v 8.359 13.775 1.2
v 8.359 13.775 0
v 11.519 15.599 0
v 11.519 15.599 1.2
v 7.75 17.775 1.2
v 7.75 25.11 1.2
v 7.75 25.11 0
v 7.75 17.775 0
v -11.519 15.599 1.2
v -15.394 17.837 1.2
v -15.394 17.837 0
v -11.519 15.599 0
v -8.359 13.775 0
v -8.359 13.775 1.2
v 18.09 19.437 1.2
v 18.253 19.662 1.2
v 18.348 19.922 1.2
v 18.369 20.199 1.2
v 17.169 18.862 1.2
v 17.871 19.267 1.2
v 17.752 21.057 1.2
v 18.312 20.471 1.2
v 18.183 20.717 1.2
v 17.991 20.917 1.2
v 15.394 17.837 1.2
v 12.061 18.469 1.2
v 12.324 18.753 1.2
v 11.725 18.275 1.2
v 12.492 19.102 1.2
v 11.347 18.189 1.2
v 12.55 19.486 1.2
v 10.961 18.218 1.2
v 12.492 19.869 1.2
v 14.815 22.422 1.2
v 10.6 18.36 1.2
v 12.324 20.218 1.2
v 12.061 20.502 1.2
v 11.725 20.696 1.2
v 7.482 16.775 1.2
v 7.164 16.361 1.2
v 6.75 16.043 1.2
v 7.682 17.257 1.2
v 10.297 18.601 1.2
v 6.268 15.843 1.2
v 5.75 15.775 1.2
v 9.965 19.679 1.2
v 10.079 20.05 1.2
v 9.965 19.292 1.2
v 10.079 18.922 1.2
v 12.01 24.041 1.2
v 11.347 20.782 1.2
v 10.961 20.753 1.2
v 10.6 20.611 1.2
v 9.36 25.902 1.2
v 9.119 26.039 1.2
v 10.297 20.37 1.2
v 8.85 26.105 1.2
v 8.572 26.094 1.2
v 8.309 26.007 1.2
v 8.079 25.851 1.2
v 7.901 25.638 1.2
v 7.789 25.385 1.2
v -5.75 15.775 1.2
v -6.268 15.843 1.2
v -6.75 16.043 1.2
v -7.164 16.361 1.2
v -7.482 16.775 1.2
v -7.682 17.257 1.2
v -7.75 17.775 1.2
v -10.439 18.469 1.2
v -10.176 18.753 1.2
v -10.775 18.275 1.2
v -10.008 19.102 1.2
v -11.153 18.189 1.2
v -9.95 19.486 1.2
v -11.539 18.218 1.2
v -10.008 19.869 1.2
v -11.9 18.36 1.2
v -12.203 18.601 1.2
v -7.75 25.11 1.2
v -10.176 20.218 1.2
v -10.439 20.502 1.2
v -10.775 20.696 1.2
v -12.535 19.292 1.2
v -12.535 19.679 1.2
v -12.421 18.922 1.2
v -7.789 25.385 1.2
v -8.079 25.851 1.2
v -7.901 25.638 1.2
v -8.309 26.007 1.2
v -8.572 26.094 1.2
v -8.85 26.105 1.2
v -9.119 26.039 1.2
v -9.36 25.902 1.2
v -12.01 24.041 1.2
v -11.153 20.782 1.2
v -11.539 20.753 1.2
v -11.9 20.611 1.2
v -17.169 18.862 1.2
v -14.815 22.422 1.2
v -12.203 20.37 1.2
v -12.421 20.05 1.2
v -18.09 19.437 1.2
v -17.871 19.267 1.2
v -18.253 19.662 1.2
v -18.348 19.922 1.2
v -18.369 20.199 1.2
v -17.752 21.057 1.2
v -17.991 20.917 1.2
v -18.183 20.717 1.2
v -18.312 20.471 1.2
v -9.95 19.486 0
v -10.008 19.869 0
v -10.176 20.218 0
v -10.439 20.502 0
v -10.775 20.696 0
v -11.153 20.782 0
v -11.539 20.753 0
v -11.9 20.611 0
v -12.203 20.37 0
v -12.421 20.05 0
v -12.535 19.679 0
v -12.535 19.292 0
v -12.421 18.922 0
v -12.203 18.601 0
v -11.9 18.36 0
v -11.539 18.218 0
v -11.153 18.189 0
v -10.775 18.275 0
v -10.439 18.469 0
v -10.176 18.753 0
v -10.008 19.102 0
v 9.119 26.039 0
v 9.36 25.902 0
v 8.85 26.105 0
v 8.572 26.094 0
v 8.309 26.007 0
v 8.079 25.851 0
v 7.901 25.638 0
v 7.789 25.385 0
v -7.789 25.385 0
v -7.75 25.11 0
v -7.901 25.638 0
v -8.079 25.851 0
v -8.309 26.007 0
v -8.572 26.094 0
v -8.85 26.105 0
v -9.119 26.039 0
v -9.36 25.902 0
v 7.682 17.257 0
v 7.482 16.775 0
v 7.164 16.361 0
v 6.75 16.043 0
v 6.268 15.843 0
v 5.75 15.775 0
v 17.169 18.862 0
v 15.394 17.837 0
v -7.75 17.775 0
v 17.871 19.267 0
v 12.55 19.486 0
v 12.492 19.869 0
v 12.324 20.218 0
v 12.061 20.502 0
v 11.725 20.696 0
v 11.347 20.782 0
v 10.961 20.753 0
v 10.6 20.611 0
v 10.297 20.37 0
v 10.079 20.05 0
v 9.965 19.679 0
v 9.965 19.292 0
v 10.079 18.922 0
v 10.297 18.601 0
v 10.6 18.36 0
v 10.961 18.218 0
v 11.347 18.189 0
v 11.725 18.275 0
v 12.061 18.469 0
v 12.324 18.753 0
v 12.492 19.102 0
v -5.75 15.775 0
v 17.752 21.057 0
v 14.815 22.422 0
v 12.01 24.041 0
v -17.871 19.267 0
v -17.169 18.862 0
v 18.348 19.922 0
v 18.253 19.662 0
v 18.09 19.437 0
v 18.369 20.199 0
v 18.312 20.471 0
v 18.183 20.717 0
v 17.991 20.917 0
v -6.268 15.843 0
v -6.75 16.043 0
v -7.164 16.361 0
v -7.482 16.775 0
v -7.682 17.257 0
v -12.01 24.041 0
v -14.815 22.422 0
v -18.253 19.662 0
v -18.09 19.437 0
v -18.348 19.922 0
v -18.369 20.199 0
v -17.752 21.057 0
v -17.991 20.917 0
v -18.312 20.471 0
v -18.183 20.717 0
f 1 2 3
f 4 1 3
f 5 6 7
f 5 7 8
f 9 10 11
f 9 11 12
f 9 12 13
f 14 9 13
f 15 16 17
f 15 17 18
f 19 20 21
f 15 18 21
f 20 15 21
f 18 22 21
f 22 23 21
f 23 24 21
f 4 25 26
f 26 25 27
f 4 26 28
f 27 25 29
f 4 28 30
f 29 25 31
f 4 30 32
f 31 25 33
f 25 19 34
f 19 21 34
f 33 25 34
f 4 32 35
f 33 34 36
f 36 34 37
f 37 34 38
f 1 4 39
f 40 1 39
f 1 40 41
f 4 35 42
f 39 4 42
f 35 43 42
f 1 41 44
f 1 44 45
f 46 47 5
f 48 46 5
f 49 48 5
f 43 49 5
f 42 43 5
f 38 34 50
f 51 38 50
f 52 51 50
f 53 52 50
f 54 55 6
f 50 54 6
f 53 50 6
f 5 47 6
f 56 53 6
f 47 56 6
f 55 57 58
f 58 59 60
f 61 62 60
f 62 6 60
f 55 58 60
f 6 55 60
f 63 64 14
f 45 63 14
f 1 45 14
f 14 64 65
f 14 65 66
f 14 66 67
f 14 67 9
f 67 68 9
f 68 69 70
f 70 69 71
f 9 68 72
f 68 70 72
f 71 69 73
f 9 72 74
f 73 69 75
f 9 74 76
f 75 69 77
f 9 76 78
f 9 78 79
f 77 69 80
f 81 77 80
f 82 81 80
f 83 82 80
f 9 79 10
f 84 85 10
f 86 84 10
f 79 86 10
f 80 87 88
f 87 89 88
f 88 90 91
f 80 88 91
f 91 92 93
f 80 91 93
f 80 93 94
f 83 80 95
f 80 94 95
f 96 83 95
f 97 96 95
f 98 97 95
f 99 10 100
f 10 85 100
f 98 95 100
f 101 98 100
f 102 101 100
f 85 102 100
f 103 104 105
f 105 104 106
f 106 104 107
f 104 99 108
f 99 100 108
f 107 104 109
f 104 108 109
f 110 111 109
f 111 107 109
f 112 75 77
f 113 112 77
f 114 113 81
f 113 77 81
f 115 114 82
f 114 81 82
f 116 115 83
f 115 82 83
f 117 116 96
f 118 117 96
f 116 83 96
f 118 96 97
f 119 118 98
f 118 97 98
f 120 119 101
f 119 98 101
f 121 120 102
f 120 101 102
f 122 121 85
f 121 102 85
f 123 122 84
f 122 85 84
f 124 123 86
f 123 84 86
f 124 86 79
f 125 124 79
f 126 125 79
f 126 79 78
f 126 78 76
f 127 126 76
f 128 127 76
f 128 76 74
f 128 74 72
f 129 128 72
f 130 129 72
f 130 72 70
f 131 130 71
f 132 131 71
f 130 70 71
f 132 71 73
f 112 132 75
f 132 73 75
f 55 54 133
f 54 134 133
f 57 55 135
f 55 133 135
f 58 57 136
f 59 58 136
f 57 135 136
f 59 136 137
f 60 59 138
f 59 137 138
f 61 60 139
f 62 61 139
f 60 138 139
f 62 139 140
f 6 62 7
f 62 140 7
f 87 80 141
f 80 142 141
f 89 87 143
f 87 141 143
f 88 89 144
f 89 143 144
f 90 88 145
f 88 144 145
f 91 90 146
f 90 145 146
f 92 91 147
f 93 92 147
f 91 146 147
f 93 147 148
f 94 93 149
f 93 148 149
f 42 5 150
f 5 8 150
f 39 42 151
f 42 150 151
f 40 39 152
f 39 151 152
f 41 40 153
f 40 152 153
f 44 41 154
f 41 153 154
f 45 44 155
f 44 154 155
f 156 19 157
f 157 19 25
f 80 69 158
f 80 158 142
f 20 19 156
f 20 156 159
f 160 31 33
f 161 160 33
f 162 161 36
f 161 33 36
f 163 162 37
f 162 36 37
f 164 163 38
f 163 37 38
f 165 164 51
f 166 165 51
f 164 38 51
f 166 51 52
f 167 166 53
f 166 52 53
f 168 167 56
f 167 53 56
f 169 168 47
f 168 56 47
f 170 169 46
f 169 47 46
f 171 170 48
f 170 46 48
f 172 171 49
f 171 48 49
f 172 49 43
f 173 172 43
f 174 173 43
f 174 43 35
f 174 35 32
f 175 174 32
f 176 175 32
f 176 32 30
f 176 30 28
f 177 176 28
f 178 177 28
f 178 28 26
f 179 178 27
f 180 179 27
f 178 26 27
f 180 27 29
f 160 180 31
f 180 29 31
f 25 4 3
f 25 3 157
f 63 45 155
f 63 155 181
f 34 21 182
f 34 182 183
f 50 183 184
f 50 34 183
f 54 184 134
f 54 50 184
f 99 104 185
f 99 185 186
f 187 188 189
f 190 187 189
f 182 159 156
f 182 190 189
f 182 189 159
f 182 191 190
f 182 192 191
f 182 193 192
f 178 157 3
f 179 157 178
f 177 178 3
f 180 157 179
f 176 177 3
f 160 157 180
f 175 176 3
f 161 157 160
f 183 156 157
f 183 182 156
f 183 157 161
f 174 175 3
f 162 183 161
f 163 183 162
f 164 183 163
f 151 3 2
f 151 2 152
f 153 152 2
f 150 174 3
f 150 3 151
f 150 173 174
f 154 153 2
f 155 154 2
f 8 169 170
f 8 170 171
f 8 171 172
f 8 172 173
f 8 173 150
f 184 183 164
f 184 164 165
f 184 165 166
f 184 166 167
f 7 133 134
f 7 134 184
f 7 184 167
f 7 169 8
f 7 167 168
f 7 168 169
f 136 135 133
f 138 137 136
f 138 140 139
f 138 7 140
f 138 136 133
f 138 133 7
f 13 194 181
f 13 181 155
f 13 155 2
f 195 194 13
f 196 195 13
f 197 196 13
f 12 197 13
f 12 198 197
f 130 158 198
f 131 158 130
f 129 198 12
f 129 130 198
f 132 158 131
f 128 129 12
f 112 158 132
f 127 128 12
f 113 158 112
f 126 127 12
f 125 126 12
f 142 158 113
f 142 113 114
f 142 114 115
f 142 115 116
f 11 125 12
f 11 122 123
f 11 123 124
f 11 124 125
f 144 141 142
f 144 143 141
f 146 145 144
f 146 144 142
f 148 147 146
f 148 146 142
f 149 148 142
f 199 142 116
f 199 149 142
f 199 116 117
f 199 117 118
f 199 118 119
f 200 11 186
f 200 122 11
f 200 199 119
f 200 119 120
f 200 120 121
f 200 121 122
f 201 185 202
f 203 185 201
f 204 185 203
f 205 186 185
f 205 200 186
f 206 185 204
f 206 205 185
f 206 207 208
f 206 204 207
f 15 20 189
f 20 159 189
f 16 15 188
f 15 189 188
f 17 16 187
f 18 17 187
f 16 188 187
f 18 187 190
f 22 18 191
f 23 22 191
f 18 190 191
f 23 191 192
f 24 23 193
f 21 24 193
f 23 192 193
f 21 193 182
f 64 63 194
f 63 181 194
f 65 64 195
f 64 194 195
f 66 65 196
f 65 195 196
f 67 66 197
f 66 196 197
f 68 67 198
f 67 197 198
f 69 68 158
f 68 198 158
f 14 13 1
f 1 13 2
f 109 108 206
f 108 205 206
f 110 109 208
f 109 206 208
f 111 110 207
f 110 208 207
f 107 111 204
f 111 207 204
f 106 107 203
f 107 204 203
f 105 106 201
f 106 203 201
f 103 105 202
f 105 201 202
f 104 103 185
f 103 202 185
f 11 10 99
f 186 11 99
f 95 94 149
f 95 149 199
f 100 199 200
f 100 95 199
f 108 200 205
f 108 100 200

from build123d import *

# Parameters (mm, degrees)
SKETCH_2_R                       = 28.3
EXTRUDE_1_DEPTH                  = 1.2
CUT_EXTRUDE_1_DEPTH              = 41.04022977
FILLET_1_R                       = 2
FILLET_2_R                       = 0.2
PATTERN_CIRCULAR_2_COUNT         = 6
FILLET_1_OF_PATTERN_CIRCULAR_2_R = 2
FILLET_2_OF_PATTERN_CIRCULAR_2_R = 0.2
SKETCH_4_R                       = 1.25
SKETCH_4_R_2                     = 1.5
CUT_EXTRUDE_2_DEPTH              = 40.283043416
CUT_EXTRUDE_START                = -1.2
CUT_EXTRUDE_4_DEPTH              = 1.2
SKETCH_7_W                       = 2.25
SKETCH_7_H                       = 2.05
EXTRUDE_2_DEPTH                  = 1.2
SKETCH_8_R                       = 1.3
CUT_EXTRUDE_6_DEPTH              = 1.2
CUT_EXTRUDE_7_DEPTH              = 1.2
FILLET_4_R                       = 1


with BuildPart() as part:
    # ｽｹｯﾁ2 → ﾎﾞｽ - 押し出し1 (new body)
    with BuildSketch(Plane.XY):
        Circle(SKETCH_2_R)
    extrude(amount=EXTRUDE_1_DEPTH)

    # ｽｹｯﾁ3 → ｶｯﾄ - 押し出し1 (cut, through all)
    with BuildSketch(Plane.XY.offset(1.2)):
        Polygon((-7.75, 30.775), (7.75, 30.775), (7.75, 24.3), (10, 24.3), (10, 22.25), (7.75, 22.25), (7.75, 15.775), (-7.75, 15.775), (-7.75, 22.25), (-10, 22.25), (-10, 24.3), (-7.75, 24.3), align=None)
    cut_extrude_1 = extrude(amount=-CUT_EXTRUDE_1_DEPTH, mode=Mode.SUBTRACT)

    # ﾌｨﾚｯﾄ1
    fillet_1_edges = [part.edges().sort_by_distance(p)[0] for p in [
        (7.75, 15.775, 0.6),
        (-7.75, 15.775, 0.6),
    ]]
    fillet(fillet_1_edges, radius=FILLET_1_R)

    # ﾌｨﾚｯﾄ2
    fillet_2_edges = [part.edges().sort_by_distance(p)[0] for p in [
        (-10, 22.25, 0.6),
        (-10, 24.3, 0.6),
        (10, 24.3, 0.6),
        (10, 22.25, 0.6),
    ]]
    fillet(fillet_2_edges, radius=FILLET_2_R)

    # 円形ﾊﾟﾀｰﾝ2: ｶｯﾄ - 押し出し1 ×6 about axis
    pattern_circular_2_axis = Axis((0, 0, 0), (0, 0, 1))
    for i in range(1, PATTERN_CIRCULAR_2_COUNT):
        add(cut_extrude_1.rotate(pattern_circular_2_axis, i * 360 / PATTERN_CIRCULAR_2_COUNT), mode=Mode.SUBTRACT)

    # ﾌｨﾚｯﾄ1 of 円形ﾊﾟﾀｰﾝ2
    fillet_1_of_pattern_circular_2_edges = [part.edges().sort_by_distance(p)[0] for p in [
        (-9.786550745, 14.599196879, 0.6),
        (-17.536550745, 1.175803121, 0.6),
        (-17.536550745, -1.175803121, 0.6),
        (-9.786550745, -14.599196879, 0.6),
        (-7.75, -15.775, 0.6),
        (7.75, -15.775, 0.6),
        (9.786550745, -14.599196879, 0.6),
        (17.536550745, -1.175803121, 0.6),
        (17.536550745, 1.175803121, 0.6),
        (9.786550745, 14.599196879, 0.6),
    ]]
    fillet(fillet_1_of_pattern_circular_2_edges, radius=FILLET_1_OF_PATTERN_CIRCULAR_2_R)

    # ﾌｨﾚｯﾄ2 of 円形ﾊﾟﾀｰﾝ2
    fillet_2_of_pattern_circular_2_edges = [part.edges().sort_by_distance(p)[0] for p in [
        (-24.269065234, 2.464745962, 0.6),
        (-26.044417312, 3.489745962, 0.6),
        (-16.044417312, 20.810254038, 0.6),
        (-14.269065234, 19.785254038, 0.6),
        (-14.269065234, -19.785254038, 0.6),
        (-16.044417312, -20.810254038, 0.6),
        (-26.044417312, -3.489745962, 0.6),
        (-24.269065234, -2.464745962, 0.6),
        (10, -22.25, 0.6),
        (10, -24.3, 0.6),
        (-10, -24.3, 0.6),
        (-10, -22.25, 0.6),
        (24.269065234, -2.464745962, 0.6),
        (26.044417312, -3.489745962, 0.6),
        (16.044417312, -20.810254038, 0.6),
        (14.269065234, -19.785254038, 0.6),
        (14.269065234, 19.785254038, 0.6),
        (16.044417312, 20.810254038, 0.6),
        (26.044417312, 3.489745962, 0.6),
        (24.269065234, 2.464745962, 0.6),
    ]]
    fillet(fillet_2_of_pattern_circular_2_edges, radius=FILLET_2_OF_PATTERN_CIRCULAR_2_R)

    # ｽｹｯﾁ4 → ｶｯﾄ - 押し出し2 (cut, through all)
    with BuildSketch(Plane.XY.offset(1.2)):
        with Locations((11.25, -19.485571585)):
            Circle(SKETCH_4_R)
        with Locations((11.25, -58.456714755)):
            Circle(SKETCH_4_R)
        with Locations((-22.5, -77.942286341)):
            Circle(SKETCH_4_R)
        with Locations((-56.25, -58.456714755)):
            Circle(SKETCH_4_R)
        with Locations((-56.25, -19.485571585)):
            Circle(SKETCH_4_R)
        with Locations((-22.5, 0)):
            Circle(SKETCH_4_R)
        with Locations((5.5, -9.526279442)):
            Circle(SKETCH_4_R_2)
        with Locations((-11, 0)):
            Circle(SKETCH_4_R_2)
        with Locations((5.5, 9.526279442)):
            Circle(SKETCH_4_R_2)
    extrude(amount=-CUT_EXTRUDE_2_DEPTH, mode=Mode.SUBTRACT)

    # ｽｹｯﾁ5 → ｶｯﾄ - 押し出し4 (cut)
    with BuildSketch(Plane.XY.offset(1.2).offset(CUT_EXTRUDE_START)):
        with BuildLine():
            Line((-19.69660633, 20.320770139), (-8.358999874, 13.775))
            Line((-8.358999874, 13.775), (8.358999874, 13.775))
            Line((8.358999874, 13.775), (19.69660633, 20.320770139))
            ThreePointArc((19.69660633, 20.320770139), (0, -28.3), (-19.69660633, 20.320770139))
        make_face()
    extrude(amount=CUT_EXTRUDE_4_DEPTH, mode=Mode.SUBTRACT)

    # ｽｹｯﾁ7 → ﾎﾞｽ - 押し出し2 (add)
    with BuildSketch(Plane.XY.offset(1.2)):
        Polygon((-17.169417312, 18.861696879), (-16.044417312, 20.810254038), (-14.269065234, 19.785254038), (-15.394065234, 17.836696879), align=None)
        Polygon((17.169417312, 18.861696879), (15.394065234, 17.836696879), (14.269065234, 19.785254038), (16.044417312, 20.810254038), align=None)
        with Locations((-8.875, 23.275)):
            Rectangle(SKETCH_7_W, SKETCH_7_H)
        with Locations((8.875, 23.275)):
            Rectangle(SKETCH_7_W, SKETCH_7_H)
    extrude(amount=-EXTRUDE_2_DEPTH)

    # ｽｹｯﾁ8 → ｶｯﾄ - 押し出し6 (cut)
    with BuildSketch(Plane.XY.offset(1.2)):
        with Locations((11.25, 19.485571585)):
            Circle(SKETCH_8_R)
        with Locations((-11.25, 19.485571585)):
            Circle(SKETCH_8_R)
    extrude(amount=-CUT_EXTRUDE_6_DEPTH, mode=Mode.SUBTRACT)

    # ｽｹｯﾁ9 → ｶｯﾄ - 押し出し7 (cut)
    with BuildSketch(Plane.XY.offset(1.2)):
        with BuildLine():
            ThreePointArc((0, 73.021527127), (68.160815364, 54.81940806), (0, 36.617288992))
            ThreePointArc((0, 36.617288992), (-68.160815364, 54.81940806), (0, 73.021527127))
        make_face()
    extrude(amount=-CUT_EXTRUDE_7_DEPTH, mode=Mode.SUBTRACT)

    # ﾌｨﾚｯﾄ4
    fillet_4_edges = [part.edges().sort_by_distance(p)[0] for p in [
        (19.69660633, 20.320770139, 0.6),
        (-19.69660633, 20.320770139, 0.6),
        (-7.75, 27.21814652, 0.6),
        (7.75, 27.21814652, 0.6),
    ]]
    fillet(fillet_4_edges, radius=FILLET_4_R)


solid = part.part
